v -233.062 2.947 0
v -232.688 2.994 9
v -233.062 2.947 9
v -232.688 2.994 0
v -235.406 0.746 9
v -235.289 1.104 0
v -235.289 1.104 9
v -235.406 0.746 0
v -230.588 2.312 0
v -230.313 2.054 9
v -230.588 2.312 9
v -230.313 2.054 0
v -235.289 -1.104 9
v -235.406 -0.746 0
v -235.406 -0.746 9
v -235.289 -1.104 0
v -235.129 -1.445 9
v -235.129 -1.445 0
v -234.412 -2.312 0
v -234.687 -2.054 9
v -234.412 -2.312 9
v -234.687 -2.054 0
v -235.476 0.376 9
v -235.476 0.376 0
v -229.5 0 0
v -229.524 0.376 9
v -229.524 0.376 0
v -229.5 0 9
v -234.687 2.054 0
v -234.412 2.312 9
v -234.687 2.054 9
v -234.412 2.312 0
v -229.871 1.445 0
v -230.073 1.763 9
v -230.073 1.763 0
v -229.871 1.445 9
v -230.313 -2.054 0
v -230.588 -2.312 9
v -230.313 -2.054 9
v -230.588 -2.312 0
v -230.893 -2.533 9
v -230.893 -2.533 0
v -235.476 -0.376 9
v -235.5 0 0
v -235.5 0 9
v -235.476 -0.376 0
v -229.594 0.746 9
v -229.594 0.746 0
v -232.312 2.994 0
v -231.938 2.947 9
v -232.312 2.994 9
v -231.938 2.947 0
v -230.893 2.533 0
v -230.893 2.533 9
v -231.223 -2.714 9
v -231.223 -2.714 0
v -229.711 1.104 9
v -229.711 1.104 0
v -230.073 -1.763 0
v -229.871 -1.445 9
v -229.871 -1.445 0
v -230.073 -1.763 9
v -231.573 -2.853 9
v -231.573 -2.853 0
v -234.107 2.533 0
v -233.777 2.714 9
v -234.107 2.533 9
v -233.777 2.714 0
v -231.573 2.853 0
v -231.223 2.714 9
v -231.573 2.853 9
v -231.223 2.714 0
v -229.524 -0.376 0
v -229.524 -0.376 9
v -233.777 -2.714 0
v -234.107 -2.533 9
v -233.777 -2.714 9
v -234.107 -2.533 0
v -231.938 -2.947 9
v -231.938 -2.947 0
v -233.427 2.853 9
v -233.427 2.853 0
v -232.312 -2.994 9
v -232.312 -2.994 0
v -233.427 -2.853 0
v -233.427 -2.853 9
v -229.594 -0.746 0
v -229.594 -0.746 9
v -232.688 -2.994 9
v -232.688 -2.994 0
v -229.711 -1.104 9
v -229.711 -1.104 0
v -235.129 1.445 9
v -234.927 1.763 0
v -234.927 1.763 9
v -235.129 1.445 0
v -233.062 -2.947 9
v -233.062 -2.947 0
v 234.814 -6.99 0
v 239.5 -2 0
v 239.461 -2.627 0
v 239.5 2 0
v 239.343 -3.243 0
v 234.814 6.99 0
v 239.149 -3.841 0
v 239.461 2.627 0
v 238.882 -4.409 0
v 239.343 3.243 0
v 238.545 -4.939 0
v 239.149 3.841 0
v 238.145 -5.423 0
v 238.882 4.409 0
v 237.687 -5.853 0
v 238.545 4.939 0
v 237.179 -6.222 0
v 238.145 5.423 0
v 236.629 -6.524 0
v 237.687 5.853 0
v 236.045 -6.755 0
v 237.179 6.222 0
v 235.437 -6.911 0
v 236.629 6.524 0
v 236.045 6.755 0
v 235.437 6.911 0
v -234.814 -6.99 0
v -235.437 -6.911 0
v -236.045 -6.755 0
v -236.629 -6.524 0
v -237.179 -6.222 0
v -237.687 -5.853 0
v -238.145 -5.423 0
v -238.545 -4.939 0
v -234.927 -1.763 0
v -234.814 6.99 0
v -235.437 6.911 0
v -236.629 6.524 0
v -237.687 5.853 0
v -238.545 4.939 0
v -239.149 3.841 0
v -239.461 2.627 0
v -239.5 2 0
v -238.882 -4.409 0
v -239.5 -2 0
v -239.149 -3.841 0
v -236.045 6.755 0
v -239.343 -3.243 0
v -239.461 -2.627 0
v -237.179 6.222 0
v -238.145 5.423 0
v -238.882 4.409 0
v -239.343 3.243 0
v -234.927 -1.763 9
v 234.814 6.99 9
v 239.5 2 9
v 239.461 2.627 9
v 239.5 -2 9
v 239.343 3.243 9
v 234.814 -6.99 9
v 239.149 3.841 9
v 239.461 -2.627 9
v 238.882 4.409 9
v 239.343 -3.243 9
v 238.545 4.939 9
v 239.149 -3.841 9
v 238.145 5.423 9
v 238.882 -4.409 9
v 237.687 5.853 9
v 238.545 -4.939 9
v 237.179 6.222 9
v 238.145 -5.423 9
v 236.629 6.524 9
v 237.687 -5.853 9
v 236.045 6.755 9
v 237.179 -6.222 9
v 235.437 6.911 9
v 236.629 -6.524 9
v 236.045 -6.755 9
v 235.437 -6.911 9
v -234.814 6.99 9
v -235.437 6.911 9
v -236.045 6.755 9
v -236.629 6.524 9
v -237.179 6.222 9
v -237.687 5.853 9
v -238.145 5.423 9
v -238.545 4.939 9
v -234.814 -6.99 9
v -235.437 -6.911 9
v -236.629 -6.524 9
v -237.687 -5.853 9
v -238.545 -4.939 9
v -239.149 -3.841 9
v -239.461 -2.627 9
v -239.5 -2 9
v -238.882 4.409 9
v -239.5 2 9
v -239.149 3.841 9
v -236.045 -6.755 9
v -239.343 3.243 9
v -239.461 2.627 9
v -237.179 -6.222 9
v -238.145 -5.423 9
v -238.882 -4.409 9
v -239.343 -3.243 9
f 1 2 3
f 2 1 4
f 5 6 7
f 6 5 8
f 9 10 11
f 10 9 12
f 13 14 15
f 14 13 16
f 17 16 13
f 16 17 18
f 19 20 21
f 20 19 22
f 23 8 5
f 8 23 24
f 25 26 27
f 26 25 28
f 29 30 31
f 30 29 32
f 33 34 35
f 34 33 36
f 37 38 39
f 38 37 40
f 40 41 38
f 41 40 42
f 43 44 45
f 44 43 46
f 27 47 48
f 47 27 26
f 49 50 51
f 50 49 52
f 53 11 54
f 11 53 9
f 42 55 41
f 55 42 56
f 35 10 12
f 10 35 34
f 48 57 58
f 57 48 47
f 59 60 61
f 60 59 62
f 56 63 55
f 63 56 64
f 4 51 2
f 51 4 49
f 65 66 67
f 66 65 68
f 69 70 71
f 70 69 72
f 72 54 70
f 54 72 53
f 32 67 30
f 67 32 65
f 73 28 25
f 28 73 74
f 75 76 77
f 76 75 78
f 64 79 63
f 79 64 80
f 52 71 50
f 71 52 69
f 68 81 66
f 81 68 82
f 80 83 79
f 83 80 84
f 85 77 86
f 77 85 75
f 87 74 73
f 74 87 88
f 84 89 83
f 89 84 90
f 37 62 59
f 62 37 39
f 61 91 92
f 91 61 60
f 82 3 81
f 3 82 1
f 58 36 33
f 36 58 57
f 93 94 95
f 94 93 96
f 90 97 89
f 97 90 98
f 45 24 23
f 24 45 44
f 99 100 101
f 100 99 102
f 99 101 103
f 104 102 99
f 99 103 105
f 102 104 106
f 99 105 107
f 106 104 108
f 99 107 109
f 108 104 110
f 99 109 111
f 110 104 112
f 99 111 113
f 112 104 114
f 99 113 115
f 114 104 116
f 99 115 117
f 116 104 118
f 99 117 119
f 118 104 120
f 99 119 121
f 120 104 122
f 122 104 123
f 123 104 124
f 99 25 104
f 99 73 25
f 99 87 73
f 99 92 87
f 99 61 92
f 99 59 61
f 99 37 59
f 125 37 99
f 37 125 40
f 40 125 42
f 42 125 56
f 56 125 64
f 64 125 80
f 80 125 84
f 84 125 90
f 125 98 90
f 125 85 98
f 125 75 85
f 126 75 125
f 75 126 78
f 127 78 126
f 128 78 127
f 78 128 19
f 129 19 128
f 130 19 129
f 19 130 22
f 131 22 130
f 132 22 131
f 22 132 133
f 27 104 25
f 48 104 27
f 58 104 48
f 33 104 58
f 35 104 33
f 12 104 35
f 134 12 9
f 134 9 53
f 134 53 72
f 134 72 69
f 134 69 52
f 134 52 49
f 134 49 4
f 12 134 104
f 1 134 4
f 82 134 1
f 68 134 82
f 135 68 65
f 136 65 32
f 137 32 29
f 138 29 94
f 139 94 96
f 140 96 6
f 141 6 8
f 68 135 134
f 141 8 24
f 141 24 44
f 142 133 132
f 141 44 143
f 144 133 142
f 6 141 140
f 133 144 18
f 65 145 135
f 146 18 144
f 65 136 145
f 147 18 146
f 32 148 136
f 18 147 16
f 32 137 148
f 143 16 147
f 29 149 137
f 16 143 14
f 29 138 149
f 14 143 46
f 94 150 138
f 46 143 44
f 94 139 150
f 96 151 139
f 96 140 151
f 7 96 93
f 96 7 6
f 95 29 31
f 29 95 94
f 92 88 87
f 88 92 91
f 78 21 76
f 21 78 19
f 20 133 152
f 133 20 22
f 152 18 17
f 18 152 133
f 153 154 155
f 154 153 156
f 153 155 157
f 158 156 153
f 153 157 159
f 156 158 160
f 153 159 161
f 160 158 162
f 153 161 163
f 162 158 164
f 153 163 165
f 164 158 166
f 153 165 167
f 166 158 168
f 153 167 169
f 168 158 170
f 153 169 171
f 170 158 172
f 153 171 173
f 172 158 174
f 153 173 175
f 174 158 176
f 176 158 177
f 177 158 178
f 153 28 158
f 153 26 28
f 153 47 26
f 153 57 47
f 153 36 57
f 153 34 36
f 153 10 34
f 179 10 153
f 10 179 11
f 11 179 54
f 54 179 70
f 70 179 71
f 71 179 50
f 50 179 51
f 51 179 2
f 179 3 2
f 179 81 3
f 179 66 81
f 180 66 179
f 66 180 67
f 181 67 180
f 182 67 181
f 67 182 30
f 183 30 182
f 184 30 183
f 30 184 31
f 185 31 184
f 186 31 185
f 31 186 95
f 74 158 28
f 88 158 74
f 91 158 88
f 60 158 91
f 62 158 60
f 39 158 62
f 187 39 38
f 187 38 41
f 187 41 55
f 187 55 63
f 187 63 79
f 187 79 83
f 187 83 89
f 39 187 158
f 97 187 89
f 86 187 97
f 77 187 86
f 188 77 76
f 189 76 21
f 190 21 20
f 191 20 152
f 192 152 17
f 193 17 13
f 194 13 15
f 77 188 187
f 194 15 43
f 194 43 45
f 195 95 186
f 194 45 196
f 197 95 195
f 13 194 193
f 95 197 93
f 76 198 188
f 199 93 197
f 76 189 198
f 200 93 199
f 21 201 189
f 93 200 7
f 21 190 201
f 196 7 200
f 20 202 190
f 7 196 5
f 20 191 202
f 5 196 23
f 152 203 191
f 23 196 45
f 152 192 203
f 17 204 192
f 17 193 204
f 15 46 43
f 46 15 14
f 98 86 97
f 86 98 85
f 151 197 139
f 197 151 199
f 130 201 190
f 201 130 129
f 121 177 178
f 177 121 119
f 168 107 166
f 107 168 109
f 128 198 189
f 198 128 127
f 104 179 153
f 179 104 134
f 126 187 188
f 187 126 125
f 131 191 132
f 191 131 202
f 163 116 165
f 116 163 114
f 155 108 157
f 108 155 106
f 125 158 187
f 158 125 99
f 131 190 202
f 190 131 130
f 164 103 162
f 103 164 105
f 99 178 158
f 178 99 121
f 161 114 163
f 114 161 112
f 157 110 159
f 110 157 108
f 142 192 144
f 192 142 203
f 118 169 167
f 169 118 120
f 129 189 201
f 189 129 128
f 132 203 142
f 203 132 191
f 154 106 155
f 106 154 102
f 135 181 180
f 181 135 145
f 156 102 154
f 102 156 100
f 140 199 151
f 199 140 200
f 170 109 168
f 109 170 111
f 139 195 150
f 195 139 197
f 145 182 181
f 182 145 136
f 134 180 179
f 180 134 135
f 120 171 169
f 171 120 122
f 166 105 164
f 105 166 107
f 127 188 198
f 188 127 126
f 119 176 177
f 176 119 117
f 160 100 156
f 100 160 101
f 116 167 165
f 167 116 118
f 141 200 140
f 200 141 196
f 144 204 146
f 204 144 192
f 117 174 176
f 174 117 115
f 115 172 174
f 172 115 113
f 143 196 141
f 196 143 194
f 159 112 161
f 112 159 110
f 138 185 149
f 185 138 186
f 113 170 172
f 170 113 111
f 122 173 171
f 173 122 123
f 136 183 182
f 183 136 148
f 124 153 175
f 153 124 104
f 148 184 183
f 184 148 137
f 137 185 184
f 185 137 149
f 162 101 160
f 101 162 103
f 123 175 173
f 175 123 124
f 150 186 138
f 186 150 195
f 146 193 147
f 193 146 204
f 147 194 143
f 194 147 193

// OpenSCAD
$fn = 50;


difference() {
	union() {
		hull() {
			translate(v = [-234.5000000000, 2.0000000000, 0]) {
				cylinder(h = 9, r = 5);
			}
			translate(v = [234.5000000000, 2.0000000000, 0]) {
				cylinder(h = 9, r = 5);
			}
			translate(v = [-234.5000000000, -2.0000000000, 0]) {
				cylinder(h = 9, r = 5);
			}
			translate(v = [234.5000000000, -2.0000000000, 0]) {
				cylinder(h = 9, r = 5);
			}
		}
	}
	union() {
		translate(v = [-232.5000000000, 0.0000000000, 0]) {
			cylinder(h = 9, r = 3.0000000000);
		}
		translate(v = [-232.5000000000, 0.0000000000, 0]) {
			cylinder(h = 9, r = 1.5000000000);
		}
		translate(v = [-232.5000000000, 0.0000000000, 0]) {
			cylinder(h = 9, r = 1.5000000000);
		}
		translate(v = [-232.5000000000, 0.0000000000, 0]) {
			cylinder(h = 9, r = 1.5000000000);
		}
	}
}
